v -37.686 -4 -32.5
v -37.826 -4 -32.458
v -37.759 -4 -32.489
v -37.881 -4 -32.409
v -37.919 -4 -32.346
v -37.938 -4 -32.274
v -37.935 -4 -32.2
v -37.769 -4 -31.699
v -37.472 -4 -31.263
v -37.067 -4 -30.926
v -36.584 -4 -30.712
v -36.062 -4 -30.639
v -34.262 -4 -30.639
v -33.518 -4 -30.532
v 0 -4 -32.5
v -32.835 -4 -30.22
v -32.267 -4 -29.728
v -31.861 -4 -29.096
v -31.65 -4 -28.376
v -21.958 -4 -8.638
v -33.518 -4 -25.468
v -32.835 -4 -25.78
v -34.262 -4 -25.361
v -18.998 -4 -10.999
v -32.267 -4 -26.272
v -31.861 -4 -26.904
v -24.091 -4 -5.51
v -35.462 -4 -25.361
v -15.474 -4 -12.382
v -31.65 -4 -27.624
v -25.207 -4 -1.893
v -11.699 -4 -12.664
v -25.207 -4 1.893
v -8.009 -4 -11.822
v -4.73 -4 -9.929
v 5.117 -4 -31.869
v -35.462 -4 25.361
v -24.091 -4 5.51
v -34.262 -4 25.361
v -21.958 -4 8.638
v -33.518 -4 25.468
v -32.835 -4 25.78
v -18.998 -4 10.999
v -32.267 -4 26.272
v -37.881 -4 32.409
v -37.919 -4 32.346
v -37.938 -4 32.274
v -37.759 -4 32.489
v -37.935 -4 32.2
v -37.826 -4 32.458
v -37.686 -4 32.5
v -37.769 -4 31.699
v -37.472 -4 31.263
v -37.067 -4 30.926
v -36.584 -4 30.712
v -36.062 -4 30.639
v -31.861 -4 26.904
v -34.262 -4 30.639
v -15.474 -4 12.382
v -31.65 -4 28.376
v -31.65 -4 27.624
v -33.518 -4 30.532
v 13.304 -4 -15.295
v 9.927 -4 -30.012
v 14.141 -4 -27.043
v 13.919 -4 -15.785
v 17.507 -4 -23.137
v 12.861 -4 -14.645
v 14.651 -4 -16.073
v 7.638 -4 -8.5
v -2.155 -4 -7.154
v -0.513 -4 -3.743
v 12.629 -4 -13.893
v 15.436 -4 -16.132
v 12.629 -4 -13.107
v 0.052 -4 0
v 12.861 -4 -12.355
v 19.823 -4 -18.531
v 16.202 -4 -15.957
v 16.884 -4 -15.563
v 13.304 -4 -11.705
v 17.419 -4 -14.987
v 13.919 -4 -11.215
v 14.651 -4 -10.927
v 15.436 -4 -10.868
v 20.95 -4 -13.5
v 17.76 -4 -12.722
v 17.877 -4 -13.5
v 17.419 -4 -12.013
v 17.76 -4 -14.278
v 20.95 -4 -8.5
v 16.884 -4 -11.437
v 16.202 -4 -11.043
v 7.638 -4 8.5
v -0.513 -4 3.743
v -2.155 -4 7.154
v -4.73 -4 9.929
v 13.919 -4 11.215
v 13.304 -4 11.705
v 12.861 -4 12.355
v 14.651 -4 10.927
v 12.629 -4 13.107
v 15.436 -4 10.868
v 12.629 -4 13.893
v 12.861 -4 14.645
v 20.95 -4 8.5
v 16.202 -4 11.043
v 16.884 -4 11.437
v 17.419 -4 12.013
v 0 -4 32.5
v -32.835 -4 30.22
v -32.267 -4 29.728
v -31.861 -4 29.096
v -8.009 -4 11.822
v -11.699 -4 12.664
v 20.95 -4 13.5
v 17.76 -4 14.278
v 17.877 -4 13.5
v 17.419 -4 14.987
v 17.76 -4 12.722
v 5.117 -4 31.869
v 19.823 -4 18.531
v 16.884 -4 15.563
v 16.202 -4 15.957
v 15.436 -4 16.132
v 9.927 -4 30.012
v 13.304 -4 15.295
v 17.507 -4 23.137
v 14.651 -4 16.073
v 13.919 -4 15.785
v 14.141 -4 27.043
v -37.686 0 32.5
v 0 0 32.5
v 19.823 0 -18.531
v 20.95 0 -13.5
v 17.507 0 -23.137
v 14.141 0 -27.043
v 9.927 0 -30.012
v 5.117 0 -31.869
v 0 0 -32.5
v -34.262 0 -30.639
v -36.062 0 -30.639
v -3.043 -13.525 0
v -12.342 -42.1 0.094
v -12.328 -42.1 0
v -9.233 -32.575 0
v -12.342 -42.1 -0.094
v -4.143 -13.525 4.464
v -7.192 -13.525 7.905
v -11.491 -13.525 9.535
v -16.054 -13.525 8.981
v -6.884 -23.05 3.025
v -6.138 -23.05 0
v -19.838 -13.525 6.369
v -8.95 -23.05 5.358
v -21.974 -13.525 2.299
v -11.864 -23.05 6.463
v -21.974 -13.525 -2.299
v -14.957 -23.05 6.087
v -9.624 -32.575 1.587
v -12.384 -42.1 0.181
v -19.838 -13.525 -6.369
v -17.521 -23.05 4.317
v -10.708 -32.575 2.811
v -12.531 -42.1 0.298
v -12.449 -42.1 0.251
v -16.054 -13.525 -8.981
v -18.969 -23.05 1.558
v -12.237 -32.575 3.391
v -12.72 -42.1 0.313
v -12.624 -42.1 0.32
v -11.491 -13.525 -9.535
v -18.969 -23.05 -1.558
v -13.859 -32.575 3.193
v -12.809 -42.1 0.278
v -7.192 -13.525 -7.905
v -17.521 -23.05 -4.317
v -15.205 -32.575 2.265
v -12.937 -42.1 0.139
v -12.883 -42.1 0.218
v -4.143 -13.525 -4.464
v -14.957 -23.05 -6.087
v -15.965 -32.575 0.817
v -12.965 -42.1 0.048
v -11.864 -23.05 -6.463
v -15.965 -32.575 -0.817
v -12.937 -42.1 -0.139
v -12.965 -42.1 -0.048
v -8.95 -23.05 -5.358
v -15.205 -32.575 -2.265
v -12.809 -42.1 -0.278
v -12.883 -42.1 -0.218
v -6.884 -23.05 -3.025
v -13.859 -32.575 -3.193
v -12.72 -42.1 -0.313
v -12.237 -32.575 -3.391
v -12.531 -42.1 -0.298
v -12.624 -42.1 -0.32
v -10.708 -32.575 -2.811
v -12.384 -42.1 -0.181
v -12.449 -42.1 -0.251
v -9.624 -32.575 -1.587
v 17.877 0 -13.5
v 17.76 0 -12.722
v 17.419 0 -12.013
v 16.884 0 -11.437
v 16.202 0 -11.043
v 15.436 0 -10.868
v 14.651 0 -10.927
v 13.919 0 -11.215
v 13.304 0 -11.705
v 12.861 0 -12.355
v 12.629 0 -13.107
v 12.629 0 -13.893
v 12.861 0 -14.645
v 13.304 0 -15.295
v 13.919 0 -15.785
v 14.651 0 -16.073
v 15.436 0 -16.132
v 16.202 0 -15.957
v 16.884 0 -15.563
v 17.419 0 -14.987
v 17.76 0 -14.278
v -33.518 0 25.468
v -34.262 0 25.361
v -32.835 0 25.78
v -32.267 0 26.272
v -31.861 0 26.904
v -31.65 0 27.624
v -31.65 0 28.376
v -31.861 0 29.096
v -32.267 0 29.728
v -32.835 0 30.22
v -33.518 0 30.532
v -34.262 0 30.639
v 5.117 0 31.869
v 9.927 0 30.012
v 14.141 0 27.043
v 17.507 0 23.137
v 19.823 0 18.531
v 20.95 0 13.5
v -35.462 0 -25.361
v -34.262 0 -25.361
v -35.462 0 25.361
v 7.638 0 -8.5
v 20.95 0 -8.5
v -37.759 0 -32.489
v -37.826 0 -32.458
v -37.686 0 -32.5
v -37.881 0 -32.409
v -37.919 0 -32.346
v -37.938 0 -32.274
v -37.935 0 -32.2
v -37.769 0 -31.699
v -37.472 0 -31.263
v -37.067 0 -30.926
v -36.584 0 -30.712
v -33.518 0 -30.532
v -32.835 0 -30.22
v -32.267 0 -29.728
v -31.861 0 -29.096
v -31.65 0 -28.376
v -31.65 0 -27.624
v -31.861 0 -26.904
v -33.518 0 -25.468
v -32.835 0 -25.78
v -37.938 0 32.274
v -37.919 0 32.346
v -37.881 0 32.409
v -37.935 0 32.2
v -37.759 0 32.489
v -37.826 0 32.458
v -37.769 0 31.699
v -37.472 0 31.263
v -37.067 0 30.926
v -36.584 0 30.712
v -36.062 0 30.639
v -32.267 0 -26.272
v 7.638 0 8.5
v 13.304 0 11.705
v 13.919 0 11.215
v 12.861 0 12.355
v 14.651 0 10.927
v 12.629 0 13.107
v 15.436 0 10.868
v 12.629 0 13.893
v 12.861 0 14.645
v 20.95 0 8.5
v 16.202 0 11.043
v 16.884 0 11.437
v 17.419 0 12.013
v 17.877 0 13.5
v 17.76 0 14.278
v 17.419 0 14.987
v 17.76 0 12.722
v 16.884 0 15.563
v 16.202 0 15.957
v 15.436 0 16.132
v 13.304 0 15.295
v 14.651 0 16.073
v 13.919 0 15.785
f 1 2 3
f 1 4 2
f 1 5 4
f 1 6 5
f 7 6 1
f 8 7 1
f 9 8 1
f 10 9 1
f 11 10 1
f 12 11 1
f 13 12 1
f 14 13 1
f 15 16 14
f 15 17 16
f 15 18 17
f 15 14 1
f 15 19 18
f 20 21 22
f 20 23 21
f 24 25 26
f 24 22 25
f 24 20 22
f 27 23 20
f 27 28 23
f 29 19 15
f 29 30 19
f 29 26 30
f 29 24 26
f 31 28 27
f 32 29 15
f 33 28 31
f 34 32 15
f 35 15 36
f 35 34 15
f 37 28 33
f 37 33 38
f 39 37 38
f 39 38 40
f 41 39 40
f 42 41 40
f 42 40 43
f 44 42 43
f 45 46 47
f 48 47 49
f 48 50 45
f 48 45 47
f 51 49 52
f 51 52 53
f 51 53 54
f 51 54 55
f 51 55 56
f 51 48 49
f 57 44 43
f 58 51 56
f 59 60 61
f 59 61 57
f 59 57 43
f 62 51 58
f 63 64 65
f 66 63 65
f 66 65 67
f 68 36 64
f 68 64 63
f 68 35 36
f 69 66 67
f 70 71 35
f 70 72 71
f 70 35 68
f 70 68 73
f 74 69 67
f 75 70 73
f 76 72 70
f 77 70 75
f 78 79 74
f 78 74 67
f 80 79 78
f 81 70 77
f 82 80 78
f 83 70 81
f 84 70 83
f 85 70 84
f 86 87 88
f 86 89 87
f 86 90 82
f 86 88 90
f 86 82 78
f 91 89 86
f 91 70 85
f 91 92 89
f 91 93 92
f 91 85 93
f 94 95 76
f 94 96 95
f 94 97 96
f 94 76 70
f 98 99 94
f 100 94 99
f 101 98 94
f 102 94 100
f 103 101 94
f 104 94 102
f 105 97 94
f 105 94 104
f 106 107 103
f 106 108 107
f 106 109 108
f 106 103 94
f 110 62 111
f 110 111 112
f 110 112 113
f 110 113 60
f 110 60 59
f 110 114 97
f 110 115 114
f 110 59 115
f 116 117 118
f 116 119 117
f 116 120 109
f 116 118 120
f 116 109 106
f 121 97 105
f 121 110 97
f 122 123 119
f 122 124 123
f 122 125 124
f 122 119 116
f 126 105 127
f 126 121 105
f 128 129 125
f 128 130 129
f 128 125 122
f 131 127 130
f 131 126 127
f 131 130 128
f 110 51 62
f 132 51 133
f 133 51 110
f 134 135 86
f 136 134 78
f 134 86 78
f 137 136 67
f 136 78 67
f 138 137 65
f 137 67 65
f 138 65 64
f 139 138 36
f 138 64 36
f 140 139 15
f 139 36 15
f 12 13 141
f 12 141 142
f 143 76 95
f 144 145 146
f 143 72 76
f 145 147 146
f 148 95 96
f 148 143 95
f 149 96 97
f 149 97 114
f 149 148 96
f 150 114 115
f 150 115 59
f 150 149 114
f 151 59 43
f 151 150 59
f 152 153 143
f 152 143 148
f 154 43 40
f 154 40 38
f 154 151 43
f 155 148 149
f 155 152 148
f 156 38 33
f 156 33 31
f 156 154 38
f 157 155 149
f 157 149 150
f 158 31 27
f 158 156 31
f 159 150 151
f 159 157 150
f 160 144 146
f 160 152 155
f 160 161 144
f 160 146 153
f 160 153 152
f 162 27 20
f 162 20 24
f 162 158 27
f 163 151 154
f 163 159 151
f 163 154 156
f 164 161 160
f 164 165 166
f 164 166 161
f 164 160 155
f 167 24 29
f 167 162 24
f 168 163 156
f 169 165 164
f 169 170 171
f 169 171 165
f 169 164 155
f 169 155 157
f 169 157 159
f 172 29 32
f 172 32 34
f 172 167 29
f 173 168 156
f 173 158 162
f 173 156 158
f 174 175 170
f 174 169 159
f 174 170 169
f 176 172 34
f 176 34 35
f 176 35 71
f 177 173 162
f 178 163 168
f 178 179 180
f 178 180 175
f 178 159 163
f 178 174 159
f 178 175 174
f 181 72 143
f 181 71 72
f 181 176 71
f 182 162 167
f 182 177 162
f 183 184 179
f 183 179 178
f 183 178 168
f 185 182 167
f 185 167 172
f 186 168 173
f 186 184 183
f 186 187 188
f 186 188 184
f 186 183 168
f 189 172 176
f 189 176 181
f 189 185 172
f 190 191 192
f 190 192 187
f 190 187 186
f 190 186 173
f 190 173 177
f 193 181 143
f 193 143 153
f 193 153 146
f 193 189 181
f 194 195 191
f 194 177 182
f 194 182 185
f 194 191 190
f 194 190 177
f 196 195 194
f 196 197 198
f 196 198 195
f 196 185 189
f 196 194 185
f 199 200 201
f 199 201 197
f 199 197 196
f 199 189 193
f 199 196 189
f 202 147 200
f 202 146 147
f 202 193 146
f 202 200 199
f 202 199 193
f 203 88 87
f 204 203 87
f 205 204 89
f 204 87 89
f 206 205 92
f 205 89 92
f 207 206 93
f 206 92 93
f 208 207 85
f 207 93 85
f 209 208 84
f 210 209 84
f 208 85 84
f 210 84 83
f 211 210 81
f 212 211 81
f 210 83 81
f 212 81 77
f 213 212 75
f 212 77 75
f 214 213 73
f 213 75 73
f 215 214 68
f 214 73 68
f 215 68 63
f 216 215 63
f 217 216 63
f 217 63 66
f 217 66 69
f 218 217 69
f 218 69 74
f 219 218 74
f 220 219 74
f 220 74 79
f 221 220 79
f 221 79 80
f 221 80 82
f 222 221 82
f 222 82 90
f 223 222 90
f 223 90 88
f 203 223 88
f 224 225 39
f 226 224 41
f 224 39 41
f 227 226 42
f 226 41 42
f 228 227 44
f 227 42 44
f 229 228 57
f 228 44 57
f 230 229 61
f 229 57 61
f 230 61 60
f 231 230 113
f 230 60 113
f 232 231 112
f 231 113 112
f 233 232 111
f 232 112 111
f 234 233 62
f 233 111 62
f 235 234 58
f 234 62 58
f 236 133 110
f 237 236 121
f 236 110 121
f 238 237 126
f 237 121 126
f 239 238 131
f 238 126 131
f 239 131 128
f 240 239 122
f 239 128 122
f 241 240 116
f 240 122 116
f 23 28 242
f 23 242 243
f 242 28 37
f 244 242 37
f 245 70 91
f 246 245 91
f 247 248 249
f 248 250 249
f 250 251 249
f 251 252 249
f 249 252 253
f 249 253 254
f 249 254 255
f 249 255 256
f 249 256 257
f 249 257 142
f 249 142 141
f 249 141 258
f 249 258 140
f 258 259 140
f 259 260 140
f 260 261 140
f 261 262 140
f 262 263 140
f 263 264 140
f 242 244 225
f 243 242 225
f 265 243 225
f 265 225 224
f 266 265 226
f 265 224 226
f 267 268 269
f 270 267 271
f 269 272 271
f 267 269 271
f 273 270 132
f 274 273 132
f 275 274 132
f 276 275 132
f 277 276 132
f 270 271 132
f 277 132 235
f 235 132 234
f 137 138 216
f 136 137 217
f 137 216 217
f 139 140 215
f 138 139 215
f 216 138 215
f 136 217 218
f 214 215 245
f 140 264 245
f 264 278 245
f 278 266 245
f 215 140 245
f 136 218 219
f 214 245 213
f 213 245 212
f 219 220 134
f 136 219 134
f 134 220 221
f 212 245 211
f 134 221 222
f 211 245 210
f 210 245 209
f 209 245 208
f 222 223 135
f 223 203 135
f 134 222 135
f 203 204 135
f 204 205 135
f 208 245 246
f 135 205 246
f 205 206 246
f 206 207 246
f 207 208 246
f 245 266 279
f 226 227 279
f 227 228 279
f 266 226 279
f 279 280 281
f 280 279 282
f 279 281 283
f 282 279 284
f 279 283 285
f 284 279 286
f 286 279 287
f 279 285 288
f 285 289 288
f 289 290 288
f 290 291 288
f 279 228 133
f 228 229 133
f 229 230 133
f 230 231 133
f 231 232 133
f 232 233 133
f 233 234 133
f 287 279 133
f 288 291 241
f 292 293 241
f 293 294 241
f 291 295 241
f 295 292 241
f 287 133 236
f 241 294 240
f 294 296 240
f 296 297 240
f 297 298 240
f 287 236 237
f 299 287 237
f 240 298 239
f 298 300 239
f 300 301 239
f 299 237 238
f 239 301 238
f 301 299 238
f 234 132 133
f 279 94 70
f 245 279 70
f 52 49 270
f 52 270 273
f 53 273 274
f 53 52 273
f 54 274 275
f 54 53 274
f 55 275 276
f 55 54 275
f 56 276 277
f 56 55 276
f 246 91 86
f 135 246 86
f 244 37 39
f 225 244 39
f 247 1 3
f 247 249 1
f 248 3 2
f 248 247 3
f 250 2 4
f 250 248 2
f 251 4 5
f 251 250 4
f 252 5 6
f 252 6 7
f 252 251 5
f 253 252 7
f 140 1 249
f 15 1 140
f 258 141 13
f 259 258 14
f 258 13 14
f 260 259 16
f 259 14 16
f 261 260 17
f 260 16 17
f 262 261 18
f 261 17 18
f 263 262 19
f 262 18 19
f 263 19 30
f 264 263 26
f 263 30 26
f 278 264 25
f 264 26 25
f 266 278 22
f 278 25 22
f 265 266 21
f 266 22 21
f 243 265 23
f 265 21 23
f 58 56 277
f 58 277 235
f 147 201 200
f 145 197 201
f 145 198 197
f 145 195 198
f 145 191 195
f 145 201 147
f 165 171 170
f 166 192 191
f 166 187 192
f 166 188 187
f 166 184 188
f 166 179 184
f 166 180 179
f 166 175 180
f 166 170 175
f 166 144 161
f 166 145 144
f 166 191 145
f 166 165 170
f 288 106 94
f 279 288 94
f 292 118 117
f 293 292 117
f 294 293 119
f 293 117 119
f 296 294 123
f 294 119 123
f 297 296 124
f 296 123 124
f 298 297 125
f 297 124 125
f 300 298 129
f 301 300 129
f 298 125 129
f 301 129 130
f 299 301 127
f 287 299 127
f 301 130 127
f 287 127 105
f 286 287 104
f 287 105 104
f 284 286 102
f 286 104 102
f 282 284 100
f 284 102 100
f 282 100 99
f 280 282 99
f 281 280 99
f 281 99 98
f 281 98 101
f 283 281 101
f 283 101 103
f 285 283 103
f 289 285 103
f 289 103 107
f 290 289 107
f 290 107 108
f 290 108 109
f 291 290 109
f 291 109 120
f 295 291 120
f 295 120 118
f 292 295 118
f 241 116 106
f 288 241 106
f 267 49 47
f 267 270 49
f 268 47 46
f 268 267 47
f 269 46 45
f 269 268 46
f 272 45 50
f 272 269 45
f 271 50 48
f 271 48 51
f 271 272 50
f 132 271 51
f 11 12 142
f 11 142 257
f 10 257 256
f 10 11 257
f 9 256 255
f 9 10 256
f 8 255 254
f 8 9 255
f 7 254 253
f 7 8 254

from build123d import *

# Parameters (mm, degrees)
F0_W     = 68.5234218836
F0_H     = 74.8608410358
F1_DEPTH = 4
F2_R     = 2.63906
F3_DEPTH = 4.001
F4_W     = 1.2
F4_H     = 50.72188
F5_DEPTH = 4
F6_R     = 0.254
F7_R     = 12.7
F8_DEPTH = 38.1
F8_TAPER = 18


with BuildPart() as f1:
    # F0 (on Front) → F1 (new body)
    with BuildSketch(Plane.XZ):
        Rectangle(F0_W, F0_H)
    extrude(amount=F1_DEPTH)

    # F2 (on face) → F3 (cut, through all)
    with BuildSketch(Plane.XZ.offset(4)):
        with Locations((-34.2617109418, 28)):
            Circle(F2_R)
        with Locations((15.2382890582, 13.5)):
            Circle(F2_R)
        with Locations((-34.2617109418, -28)):
            Circle(F2_R)
        with Locations((15.2382890582, -13.5)):
            Circle(F2_R)
        with BuildLine():
            Line((20.95, 8.5), (7.6382890582, 8.5))
            Line((7.6382890582, 8.5), (7.6382890582, 0))
            Line((7.6382890582, 0), (34.2617109418, 0))
            Line((34.2617109418, 0), (34.2617109418, 8.5))
            Line((34.2617109418, 8.5), (34.2617109418, 37.4304205179))
            Line((34.2617109418, 37.4304205179), (-34.2617109418, 37.4304205179))
            Line((-34.2617109418, 37.4304205179), (-34.2617109418, 32.5))
            Line((-34.2617109418, 32.5), (0, 32.5))
            ThreePointArc((0, 32.5), (14.1412738111, 27.0425492812), (20.95, 13.5))
            Line((20.95, 13.5), (20.95, 8.5))
        make_face()
        with BuildLine():
            Line((34.2617109418, 0), (7.6382890582, 0))
            Line((7.6382890582, 0), (7.6382890582, -8.5))
            Line((7.6382890582, -8.5), (20.95, -8.5))
            Line((20.95, -8.5), (20.95, -13.5))
            ThreePointArc((20.95, -13.5), (14.1412738111, -27.0425492812), (0, -32.5))
            Line((0, -32.5), (-34.2617109418, -32.5))
            Line((-34.2617109418, -32.5), (-34.2617109418, -37.4304205179))
            Line((-34.2617109418, -37.4304205179), (34.2617109418, -37.4304205179))
            Line((34.2617109418, -37.4304205179), (34.2617109418, -8.5))
            Line((34.2617109418, -8.5), (34.2617109418, 0))
        make_face()
    extrude(amount=-F3_DEPTH, mode=Mode.SUBTRACT)

    # F4 (on face) → F5 (join, through all)
    with BuildSketch(Plane.XZ.offset(4)):
        with BuildLine():
            Line((-34.2617109418, -32.5), (-34.2617109418, -30.63906))
            Line((-34.2617109418, -30.63906), (-36.0617109418, -30.63906))
            ThreePointArc((-36.0617109418, -30.63906), (-37.3930806688, -31.1815330645), (-37.9662013504, -32.5))
            Line((-37.9662013504, -32.5), (-34.2617109418, -32.5))
        make_face()
        with Locations((-34.8617109418, 0)):
            Rectangle(F4_W, F4_H)
        with BuildLine():
            Line((-36.0617109418, 30.63906), (-34.2617109418, 30.63906))
            Line((-34.2617109418, 30.63906), (-34.2617109418, 32.5))
            Line((-34.2617109418, 32.5), (-37.9662013504, 32.5))
            ThreePointArc((-37.9662013504, 32.5), (-37.3930806688, 31.1815330645), (-36.0617109418, 30.63906))
        make_face()
    extrude(amount=-F5_DEPTH)

    # F6
    f6_edges = [f1.edges().sort_by_distance(p)[0] for p in [
        (-37.966201, -2, -32.5),
        (-37.966201, -2, 32.5),
    ]]
    fillet(f6_edges, radius=F6_R)

    # F7 (on face) → F8 (join)
    with BuildSketch(Plane.XZ.offset(4)):
        with Locations((-12.6483709418, 0)):
            Circle(F7_R)
    extrude(amount=F8_DEPTH, taper=F8_TAPER)


solid = f1.part
